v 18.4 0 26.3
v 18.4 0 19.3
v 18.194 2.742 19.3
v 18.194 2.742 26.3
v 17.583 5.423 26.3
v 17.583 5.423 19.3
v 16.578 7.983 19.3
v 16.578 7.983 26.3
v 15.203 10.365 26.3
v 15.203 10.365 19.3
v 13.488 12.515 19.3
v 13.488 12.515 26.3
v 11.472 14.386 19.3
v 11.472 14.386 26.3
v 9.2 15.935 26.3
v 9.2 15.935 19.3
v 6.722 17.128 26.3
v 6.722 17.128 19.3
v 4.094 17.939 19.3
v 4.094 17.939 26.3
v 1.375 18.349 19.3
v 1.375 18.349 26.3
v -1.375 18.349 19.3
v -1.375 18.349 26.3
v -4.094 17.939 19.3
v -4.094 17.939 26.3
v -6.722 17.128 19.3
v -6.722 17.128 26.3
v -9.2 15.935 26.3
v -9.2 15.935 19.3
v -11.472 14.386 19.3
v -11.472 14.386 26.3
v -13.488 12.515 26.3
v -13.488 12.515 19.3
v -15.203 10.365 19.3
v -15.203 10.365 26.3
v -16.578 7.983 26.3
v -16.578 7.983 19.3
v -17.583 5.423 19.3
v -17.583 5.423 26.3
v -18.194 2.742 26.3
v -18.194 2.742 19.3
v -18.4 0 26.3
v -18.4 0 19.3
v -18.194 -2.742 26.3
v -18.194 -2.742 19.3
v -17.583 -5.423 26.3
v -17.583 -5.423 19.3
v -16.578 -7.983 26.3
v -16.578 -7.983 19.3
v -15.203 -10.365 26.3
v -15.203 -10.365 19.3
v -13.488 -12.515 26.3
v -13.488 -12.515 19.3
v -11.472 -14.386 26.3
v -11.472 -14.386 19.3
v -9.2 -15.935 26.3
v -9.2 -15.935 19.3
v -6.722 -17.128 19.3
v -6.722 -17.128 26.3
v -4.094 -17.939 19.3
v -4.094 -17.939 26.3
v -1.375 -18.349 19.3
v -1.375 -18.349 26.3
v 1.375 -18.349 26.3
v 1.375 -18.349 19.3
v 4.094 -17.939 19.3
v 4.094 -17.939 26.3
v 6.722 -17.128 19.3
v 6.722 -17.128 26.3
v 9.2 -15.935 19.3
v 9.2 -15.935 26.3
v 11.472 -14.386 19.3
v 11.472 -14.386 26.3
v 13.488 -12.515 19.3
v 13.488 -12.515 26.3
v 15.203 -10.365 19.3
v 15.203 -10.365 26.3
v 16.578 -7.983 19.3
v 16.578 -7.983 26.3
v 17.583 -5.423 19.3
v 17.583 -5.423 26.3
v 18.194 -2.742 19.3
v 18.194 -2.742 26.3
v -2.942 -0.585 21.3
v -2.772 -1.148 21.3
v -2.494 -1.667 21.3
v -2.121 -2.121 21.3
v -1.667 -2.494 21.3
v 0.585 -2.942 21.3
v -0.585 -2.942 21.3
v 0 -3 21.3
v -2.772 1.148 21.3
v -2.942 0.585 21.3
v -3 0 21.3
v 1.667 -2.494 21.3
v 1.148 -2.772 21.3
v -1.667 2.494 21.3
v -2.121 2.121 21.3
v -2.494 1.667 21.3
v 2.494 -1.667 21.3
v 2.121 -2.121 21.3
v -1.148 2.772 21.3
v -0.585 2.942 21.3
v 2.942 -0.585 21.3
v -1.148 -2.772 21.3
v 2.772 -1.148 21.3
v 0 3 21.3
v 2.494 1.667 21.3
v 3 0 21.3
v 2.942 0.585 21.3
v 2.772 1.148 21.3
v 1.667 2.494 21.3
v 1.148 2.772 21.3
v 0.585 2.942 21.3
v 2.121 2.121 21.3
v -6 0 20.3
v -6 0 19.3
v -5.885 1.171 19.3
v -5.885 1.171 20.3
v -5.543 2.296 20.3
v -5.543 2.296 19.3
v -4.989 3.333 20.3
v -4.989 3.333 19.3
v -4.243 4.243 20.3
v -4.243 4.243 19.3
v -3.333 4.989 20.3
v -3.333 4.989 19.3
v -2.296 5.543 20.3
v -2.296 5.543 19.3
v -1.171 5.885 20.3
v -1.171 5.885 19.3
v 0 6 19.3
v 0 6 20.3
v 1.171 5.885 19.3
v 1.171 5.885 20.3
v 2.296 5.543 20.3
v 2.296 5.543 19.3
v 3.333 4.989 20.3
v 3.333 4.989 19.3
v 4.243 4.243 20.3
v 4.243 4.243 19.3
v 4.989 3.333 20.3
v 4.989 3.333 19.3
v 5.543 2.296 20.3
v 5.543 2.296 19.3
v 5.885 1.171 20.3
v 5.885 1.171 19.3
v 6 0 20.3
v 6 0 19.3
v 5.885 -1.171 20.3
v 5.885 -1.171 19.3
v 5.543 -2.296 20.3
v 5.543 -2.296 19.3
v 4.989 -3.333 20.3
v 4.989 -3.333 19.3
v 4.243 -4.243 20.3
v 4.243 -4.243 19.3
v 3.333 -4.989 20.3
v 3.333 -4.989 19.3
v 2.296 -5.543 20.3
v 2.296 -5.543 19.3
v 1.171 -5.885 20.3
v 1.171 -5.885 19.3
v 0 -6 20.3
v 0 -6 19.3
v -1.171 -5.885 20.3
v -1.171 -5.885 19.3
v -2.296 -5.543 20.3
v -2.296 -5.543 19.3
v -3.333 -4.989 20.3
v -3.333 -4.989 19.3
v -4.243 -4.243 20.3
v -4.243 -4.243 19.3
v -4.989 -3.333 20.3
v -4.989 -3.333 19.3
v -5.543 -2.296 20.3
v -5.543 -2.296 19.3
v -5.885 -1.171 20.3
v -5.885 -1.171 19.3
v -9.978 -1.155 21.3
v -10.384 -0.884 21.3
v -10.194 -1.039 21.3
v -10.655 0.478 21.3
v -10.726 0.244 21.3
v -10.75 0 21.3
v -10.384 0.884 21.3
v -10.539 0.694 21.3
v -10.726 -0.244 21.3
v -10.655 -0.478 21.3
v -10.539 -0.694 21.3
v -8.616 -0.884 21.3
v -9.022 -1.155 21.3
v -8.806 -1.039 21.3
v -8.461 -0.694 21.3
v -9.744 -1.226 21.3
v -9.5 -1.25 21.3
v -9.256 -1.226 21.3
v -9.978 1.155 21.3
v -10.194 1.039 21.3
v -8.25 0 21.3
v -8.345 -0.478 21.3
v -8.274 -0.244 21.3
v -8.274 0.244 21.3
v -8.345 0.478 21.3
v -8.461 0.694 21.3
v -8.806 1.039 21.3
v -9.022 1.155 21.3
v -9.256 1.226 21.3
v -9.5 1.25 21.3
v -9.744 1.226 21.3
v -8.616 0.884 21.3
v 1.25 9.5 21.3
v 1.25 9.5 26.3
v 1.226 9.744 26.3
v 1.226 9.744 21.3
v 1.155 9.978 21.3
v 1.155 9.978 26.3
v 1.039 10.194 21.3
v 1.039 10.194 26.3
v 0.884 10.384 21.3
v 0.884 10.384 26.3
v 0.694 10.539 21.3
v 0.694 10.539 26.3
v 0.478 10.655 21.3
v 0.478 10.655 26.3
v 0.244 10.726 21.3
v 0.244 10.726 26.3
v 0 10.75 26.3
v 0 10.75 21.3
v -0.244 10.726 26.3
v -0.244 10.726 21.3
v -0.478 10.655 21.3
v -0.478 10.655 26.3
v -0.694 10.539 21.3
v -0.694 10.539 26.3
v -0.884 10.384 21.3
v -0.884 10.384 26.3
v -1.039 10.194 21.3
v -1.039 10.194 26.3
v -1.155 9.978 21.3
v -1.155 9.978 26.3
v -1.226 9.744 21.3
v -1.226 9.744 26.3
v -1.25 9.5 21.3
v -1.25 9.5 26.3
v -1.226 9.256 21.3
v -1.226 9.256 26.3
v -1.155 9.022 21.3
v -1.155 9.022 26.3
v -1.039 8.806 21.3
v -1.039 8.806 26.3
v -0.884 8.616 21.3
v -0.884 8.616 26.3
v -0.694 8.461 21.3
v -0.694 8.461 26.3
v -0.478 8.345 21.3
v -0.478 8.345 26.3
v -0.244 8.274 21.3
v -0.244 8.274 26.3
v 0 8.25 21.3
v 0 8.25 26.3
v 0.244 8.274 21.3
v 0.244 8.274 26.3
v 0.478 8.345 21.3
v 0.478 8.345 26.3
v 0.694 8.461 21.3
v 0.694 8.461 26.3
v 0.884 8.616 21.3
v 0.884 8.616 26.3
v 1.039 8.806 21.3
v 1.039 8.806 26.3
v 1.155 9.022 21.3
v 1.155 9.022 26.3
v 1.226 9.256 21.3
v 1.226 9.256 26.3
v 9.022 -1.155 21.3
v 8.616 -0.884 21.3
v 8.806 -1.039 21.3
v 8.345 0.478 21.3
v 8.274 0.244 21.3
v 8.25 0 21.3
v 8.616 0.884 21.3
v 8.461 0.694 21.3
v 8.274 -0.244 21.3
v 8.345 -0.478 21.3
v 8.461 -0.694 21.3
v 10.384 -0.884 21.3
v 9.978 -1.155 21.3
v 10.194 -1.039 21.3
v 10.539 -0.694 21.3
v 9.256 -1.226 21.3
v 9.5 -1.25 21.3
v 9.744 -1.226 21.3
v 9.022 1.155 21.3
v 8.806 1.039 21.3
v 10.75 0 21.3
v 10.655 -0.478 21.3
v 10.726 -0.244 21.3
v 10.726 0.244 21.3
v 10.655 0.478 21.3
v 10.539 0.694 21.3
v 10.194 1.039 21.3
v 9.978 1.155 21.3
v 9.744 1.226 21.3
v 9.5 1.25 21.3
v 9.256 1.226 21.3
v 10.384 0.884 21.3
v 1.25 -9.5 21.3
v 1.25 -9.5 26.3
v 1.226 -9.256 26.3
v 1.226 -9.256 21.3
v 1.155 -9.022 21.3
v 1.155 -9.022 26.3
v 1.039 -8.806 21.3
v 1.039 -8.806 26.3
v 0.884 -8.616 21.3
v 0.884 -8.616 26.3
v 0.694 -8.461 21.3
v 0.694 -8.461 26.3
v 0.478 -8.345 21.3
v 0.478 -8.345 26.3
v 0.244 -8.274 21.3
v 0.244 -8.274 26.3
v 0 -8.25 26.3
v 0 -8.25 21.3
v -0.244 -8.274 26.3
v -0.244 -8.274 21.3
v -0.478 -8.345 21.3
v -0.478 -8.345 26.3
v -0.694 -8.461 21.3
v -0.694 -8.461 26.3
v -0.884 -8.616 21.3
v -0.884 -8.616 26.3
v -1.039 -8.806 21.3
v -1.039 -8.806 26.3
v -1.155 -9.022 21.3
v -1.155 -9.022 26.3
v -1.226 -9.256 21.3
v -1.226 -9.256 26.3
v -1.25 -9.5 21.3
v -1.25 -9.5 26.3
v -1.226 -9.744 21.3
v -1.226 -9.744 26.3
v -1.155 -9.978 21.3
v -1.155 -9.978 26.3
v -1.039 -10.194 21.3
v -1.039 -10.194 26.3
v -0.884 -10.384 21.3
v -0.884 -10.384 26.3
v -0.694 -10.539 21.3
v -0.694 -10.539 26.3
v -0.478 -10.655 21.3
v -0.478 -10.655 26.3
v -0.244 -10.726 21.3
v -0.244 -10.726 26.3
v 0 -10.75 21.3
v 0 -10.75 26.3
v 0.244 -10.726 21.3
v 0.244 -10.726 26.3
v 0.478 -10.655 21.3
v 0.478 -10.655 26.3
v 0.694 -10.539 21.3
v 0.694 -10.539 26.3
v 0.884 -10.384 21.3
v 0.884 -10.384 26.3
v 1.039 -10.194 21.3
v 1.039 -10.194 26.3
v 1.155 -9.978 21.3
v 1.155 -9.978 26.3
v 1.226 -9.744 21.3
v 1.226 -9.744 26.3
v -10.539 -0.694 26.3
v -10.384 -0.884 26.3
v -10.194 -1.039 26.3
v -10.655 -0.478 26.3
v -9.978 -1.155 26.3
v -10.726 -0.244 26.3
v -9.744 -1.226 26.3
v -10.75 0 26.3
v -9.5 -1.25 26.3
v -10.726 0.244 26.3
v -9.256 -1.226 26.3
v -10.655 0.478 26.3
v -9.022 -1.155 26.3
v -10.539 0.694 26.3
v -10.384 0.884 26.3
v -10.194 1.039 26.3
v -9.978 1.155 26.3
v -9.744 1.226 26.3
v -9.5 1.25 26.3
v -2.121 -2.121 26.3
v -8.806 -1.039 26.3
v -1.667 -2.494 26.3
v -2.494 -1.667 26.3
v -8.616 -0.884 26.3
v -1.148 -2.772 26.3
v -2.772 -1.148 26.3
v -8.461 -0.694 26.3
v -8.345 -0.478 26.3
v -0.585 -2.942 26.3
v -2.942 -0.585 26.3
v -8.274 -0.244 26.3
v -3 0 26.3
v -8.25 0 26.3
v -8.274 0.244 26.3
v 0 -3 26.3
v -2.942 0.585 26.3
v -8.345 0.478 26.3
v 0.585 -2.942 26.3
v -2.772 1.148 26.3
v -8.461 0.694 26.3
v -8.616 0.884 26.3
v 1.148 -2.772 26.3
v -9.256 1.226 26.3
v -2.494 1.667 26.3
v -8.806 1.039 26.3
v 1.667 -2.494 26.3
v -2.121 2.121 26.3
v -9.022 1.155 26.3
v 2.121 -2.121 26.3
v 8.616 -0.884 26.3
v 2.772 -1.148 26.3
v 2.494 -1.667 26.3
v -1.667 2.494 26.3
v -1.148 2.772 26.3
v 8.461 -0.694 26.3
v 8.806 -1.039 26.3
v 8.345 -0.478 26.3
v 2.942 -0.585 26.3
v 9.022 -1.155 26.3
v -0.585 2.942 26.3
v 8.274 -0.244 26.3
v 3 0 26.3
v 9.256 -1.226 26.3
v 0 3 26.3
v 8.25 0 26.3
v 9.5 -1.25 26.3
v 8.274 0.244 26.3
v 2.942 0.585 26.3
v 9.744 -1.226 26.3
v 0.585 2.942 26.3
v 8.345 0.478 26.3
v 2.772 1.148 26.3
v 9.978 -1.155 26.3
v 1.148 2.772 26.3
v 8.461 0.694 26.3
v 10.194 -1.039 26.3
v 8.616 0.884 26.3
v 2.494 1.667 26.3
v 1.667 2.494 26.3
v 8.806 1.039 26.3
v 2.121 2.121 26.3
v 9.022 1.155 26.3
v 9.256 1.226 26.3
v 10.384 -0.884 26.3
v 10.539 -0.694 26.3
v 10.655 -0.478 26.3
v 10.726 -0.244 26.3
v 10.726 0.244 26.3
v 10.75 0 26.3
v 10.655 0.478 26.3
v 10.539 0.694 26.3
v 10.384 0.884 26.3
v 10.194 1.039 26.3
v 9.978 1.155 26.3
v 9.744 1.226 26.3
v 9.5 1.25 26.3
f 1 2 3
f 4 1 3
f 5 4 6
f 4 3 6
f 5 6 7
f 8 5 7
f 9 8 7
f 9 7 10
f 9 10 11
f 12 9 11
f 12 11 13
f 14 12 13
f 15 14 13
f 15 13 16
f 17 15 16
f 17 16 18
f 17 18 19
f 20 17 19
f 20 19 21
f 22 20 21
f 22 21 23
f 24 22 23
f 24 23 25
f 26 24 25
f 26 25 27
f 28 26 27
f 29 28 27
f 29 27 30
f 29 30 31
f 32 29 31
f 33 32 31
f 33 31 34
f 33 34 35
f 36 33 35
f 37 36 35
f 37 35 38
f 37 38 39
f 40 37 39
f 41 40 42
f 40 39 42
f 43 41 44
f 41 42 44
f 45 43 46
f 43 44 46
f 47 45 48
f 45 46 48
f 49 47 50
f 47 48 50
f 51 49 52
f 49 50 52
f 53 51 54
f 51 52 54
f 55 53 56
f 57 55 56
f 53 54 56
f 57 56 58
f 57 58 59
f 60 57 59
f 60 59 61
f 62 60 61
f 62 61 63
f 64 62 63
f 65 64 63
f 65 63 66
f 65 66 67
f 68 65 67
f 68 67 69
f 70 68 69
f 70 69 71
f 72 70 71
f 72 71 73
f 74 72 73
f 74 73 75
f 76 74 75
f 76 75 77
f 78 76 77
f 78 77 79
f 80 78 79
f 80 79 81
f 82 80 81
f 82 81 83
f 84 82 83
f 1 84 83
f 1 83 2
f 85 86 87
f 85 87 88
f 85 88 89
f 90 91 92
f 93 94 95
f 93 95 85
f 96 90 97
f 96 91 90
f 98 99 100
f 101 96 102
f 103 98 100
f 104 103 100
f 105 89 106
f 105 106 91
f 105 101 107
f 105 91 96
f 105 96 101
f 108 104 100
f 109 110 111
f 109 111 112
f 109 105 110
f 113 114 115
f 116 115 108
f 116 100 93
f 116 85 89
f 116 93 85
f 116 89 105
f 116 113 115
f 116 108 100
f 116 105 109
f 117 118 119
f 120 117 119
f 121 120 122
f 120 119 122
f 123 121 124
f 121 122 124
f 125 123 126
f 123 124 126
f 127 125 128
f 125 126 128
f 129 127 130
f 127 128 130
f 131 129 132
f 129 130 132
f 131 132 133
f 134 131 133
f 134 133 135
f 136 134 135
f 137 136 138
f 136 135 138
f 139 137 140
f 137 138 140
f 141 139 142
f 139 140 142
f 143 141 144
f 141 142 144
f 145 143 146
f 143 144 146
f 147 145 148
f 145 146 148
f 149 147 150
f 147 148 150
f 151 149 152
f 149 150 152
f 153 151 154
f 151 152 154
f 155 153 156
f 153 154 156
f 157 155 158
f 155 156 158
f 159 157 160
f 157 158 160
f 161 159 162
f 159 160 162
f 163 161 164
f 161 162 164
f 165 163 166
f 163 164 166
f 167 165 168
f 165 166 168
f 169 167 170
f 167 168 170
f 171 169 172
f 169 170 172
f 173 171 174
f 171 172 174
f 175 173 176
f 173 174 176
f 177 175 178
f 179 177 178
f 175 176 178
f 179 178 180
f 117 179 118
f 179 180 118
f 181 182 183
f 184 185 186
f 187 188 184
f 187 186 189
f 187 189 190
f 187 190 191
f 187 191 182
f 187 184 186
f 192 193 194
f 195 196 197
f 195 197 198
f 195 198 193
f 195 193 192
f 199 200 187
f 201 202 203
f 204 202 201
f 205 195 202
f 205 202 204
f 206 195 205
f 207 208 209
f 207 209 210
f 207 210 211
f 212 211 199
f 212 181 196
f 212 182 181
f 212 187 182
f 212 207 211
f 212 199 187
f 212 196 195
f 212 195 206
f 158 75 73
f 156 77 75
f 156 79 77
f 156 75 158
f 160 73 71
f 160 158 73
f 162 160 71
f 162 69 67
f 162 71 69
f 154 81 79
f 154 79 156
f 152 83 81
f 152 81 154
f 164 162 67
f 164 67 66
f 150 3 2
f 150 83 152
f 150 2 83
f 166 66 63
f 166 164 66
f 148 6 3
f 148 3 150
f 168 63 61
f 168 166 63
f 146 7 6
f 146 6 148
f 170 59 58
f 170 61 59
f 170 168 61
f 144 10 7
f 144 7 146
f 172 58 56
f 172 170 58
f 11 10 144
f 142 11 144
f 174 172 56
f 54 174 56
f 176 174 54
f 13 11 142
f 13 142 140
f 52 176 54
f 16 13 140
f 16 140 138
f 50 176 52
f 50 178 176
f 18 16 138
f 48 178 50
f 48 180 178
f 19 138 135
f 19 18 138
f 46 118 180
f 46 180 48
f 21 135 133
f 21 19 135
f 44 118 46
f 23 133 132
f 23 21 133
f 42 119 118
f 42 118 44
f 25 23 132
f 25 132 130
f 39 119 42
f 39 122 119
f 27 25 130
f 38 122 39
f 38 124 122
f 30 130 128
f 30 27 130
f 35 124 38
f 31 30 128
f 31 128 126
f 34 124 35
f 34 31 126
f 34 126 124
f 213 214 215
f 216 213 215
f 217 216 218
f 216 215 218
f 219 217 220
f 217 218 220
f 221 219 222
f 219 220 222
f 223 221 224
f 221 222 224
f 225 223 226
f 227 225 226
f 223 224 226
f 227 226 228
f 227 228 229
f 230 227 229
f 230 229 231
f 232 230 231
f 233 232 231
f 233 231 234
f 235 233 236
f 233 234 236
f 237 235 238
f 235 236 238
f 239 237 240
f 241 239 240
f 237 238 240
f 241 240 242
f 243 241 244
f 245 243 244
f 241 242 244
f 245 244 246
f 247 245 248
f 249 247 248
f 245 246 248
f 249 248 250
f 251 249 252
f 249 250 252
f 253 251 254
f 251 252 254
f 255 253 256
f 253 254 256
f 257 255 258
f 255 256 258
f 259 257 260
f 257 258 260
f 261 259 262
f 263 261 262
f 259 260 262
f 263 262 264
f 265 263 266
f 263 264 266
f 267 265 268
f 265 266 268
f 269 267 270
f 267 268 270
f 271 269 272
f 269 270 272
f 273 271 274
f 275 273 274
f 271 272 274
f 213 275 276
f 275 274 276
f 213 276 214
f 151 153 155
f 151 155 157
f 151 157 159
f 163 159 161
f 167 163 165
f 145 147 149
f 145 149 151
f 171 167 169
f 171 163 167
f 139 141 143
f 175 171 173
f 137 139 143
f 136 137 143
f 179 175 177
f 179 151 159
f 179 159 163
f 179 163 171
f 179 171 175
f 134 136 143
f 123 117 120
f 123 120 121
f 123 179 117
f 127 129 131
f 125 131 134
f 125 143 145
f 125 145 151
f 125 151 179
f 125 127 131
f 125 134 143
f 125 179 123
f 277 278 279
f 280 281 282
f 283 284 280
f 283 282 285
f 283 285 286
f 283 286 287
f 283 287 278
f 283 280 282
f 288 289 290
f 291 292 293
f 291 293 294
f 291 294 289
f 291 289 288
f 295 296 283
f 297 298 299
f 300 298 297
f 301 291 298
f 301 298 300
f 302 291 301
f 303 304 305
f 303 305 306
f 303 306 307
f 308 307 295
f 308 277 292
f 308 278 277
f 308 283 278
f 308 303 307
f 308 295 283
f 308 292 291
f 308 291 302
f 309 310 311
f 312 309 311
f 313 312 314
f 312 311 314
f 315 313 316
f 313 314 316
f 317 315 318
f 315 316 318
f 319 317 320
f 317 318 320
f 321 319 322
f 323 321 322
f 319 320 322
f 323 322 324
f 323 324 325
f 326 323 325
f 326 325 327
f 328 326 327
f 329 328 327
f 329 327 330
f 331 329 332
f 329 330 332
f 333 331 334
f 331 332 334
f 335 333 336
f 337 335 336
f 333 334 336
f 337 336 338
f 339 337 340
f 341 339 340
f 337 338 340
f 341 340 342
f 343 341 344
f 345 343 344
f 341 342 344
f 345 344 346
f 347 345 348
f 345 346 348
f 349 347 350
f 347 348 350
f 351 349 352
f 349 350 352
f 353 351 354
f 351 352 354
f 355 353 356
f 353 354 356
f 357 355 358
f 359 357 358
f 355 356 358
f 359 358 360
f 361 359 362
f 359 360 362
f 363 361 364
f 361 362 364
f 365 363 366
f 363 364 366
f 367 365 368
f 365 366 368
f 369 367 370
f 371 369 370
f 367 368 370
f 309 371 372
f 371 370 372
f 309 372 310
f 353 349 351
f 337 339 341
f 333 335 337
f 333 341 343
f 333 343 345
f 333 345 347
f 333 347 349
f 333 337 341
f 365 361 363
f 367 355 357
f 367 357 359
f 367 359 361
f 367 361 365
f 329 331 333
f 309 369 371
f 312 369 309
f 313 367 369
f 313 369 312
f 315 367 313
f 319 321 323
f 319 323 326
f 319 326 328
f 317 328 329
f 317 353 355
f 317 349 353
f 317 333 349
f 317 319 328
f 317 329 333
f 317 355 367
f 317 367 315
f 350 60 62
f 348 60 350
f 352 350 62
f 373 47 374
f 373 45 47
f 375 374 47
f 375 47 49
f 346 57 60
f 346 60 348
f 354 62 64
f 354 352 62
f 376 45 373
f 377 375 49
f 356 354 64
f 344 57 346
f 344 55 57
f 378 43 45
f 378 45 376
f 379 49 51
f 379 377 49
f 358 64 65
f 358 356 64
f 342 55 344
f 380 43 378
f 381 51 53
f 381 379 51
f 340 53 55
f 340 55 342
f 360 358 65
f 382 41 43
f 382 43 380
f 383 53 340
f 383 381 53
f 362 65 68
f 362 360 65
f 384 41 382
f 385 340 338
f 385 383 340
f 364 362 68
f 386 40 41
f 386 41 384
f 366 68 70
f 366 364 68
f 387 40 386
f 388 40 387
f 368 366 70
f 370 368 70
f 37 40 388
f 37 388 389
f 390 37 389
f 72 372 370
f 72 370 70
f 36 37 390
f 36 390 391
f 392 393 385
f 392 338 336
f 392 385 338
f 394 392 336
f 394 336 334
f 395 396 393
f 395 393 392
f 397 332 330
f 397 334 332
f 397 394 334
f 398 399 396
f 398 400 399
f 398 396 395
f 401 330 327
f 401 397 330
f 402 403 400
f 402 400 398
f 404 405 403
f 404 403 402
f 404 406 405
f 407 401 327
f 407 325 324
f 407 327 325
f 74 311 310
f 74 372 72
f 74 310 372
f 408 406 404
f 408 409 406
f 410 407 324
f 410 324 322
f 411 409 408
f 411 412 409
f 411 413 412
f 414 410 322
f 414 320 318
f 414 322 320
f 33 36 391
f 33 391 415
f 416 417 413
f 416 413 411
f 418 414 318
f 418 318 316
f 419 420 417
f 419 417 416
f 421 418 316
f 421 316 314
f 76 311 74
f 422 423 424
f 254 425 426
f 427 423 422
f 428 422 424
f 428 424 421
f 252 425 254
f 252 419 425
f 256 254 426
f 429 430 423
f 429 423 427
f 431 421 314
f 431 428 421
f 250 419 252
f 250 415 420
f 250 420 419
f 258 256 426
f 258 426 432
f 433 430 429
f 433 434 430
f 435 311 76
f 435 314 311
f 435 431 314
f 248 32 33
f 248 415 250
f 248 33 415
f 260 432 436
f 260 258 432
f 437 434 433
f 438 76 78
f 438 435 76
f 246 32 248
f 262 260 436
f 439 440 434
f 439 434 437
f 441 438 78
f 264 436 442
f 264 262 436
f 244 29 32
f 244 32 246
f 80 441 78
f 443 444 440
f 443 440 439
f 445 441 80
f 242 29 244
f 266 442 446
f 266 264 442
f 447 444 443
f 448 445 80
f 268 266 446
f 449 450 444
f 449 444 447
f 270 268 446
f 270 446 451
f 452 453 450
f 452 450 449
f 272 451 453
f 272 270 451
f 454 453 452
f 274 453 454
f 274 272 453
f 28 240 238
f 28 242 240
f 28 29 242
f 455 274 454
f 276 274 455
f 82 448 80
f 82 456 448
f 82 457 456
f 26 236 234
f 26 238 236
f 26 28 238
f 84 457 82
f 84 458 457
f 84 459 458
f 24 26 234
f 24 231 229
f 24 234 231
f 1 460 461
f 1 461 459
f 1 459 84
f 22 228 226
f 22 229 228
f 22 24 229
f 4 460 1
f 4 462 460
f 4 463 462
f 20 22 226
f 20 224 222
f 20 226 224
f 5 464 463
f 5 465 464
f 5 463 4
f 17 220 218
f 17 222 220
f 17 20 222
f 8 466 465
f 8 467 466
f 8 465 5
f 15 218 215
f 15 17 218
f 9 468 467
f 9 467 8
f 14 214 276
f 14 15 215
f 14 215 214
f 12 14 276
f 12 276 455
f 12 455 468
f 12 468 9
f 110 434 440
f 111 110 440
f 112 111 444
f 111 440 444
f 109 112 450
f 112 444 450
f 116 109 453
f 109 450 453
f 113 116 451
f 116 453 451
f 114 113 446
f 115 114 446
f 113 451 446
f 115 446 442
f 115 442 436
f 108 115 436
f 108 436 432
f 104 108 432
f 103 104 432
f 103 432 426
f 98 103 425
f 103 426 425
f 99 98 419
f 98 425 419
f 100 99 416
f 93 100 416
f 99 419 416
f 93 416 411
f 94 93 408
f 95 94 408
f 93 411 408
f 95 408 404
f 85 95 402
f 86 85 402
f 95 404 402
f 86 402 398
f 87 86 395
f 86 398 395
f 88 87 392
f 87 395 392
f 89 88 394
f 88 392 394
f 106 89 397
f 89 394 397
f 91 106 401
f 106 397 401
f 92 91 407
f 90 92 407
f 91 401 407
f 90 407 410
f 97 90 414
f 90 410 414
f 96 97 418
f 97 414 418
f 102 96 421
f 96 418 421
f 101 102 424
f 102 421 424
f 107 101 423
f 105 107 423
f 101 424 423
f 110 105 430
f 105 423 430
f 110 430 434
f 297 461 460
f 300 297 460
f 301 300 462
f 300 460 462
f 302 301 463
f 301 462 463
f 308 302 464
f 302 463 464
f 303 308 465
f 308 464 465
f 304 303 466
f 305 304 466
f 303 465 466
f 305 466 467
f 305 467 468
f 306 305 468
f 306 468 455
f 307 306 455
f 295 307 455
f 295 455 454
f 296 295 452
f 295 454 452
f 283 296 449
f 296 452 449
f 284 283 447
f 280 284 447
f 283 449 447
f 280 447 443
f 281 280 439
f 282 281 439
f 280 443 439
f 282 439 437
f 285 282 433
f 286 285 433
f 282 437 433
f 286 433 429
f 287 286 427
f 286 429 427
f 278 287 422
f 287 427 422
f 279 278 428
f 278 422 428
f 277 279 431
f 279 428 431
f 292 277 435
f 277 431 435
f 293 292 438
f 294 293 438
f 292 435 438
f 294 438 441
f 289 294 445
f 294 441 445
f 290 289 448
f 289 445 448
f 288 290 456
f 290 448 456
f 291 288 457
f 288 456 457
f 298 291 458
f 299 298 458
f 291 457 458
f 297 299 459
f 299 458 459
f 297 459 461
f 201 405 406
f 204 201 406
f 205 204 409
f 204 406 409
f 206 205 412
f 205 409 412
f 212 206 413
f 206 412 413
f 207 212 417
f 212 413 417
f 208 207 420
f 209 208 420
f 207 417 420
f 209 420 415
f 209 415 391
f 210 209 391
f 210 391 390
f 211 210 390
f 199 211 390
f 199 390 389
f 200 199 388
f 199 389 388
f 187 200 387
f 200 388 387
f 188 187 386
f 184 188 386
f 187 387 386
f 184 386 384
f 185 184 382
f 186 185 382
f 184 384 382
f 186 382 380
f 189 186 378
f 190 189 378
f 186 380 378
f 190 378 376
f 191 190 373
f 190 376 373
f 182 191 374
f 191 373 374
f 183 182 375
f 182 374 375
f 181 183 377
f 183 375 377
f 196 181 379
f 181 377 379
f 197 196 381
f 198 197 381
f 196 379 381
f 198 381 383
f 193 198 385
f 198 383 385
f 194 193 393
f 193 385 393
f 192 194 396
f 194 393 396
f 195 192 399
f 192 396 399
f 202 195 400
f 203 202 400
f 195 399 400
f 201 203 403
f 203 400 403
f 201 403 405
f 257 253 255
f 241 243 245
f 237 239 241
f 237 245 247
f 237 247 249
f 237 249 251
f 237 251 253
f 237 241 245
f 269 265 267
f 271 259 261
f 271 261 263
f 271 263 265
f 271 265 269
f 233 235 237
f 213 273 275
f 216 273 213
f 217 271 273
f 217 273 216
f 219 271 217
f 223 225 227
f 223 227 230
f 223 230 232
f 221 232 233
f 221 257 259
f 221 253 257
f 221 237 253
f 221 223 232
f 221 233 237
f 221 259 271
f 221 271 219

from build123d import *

# Parameters (mm, degrees)
CROQUIS1_R              = 18.4
SALIENTE_EXTRUIR1_DEPTH = 26.3
CROQUIS2_R              = 3
CROQUIS2_R_2            = 1.25
CORTAR_EXTRUIR1_DEPTH   = 5
CROQUIS3_R              = 1.25
CORTAR_EXTRUIR2_DEPTH   = 5
CROQUIS7_R              = 18.4
CORTAR_EXTRUIR5_DEPTH   = 19.3
CROQUIS8_R              = 6
CORTAR_EXTRUIR6_DEPTH   = 1


with BuildPart() as part:
    # Croquis1 → Saliente-Extruir1 (new body)
    with BuildSketch(Plane.XY):
        Circle(CROQUIS1_R)
    extrude(amount=SALIENTE_EXTRUIR1_DEPTH)

    # Croquis2 → Cortar-Extruir1 (cut)
    with BuildSketch(Plane.XY.offset(26.3)):
        Circle(CROQUIS2_R)
        with Locations((0, 9.5)):
            Circle(CROQUIS2_R_2)
        with Locations((9.5, 0)):
            Circle(CROQUIS2_R_2)
        with Locations((0, -9.5)):
            Circle(CROQUIS2_R_2)
        with Locations((-9.5, 0)):
            Circle(CROQUIS2_R_2)
    extrude(amount=-CORTAR_EXTRUIR1_DEPTH, mode=Mode.SUBTRACT)

    # Croquis3 → Cortar-Extruir2 (cut)
    with BuildSketch(Plane(origin=(0, 0, 0), x_dir=(-1, 0, 0), z_dir=(0, 0, -1))):
        with Locations((-10, 0)):
            Circle(CROQUIS3_R)
        with Locations((0, 10)):
            Circle(CROQUIS3_R)
        with Locations((10, 0)):
            Circle(CROQUIS3_R)
        with Locations((0, -10)):
            Circle(CROQUIS3_R)
    extrude(amount=-CORTAR_EXTRUIR2_DEPTH, mode=Mode.SUBTRACT)

    # Croquis7 → Cortar-Extruir5 (cut)
    with BuildSketch(Plane(origin=(0, 0, 0), x_dir=(-1, 0, 0), z_dir=(0, 0, -1))):
        Circle(CROQUIS7_R)
    extrude(amount=-CORTAR_EXTRUIR5_DEPTH, mode=Mode.SUBTRACT)

    # Croquis8 → Cortar-Extruir6 (cut)
    with BuildSketch(Plane(origin=(0, 0, 19.3), x_dir=(-1, 0, 0), z_dir=(0, 0, -1))):
        Circle(CROQUIS8_R)
    extrude(amount=-CORTAR_EXTRUIR6_DEPTH, mode=Mode.SUBTRACT)


solid = part.part
